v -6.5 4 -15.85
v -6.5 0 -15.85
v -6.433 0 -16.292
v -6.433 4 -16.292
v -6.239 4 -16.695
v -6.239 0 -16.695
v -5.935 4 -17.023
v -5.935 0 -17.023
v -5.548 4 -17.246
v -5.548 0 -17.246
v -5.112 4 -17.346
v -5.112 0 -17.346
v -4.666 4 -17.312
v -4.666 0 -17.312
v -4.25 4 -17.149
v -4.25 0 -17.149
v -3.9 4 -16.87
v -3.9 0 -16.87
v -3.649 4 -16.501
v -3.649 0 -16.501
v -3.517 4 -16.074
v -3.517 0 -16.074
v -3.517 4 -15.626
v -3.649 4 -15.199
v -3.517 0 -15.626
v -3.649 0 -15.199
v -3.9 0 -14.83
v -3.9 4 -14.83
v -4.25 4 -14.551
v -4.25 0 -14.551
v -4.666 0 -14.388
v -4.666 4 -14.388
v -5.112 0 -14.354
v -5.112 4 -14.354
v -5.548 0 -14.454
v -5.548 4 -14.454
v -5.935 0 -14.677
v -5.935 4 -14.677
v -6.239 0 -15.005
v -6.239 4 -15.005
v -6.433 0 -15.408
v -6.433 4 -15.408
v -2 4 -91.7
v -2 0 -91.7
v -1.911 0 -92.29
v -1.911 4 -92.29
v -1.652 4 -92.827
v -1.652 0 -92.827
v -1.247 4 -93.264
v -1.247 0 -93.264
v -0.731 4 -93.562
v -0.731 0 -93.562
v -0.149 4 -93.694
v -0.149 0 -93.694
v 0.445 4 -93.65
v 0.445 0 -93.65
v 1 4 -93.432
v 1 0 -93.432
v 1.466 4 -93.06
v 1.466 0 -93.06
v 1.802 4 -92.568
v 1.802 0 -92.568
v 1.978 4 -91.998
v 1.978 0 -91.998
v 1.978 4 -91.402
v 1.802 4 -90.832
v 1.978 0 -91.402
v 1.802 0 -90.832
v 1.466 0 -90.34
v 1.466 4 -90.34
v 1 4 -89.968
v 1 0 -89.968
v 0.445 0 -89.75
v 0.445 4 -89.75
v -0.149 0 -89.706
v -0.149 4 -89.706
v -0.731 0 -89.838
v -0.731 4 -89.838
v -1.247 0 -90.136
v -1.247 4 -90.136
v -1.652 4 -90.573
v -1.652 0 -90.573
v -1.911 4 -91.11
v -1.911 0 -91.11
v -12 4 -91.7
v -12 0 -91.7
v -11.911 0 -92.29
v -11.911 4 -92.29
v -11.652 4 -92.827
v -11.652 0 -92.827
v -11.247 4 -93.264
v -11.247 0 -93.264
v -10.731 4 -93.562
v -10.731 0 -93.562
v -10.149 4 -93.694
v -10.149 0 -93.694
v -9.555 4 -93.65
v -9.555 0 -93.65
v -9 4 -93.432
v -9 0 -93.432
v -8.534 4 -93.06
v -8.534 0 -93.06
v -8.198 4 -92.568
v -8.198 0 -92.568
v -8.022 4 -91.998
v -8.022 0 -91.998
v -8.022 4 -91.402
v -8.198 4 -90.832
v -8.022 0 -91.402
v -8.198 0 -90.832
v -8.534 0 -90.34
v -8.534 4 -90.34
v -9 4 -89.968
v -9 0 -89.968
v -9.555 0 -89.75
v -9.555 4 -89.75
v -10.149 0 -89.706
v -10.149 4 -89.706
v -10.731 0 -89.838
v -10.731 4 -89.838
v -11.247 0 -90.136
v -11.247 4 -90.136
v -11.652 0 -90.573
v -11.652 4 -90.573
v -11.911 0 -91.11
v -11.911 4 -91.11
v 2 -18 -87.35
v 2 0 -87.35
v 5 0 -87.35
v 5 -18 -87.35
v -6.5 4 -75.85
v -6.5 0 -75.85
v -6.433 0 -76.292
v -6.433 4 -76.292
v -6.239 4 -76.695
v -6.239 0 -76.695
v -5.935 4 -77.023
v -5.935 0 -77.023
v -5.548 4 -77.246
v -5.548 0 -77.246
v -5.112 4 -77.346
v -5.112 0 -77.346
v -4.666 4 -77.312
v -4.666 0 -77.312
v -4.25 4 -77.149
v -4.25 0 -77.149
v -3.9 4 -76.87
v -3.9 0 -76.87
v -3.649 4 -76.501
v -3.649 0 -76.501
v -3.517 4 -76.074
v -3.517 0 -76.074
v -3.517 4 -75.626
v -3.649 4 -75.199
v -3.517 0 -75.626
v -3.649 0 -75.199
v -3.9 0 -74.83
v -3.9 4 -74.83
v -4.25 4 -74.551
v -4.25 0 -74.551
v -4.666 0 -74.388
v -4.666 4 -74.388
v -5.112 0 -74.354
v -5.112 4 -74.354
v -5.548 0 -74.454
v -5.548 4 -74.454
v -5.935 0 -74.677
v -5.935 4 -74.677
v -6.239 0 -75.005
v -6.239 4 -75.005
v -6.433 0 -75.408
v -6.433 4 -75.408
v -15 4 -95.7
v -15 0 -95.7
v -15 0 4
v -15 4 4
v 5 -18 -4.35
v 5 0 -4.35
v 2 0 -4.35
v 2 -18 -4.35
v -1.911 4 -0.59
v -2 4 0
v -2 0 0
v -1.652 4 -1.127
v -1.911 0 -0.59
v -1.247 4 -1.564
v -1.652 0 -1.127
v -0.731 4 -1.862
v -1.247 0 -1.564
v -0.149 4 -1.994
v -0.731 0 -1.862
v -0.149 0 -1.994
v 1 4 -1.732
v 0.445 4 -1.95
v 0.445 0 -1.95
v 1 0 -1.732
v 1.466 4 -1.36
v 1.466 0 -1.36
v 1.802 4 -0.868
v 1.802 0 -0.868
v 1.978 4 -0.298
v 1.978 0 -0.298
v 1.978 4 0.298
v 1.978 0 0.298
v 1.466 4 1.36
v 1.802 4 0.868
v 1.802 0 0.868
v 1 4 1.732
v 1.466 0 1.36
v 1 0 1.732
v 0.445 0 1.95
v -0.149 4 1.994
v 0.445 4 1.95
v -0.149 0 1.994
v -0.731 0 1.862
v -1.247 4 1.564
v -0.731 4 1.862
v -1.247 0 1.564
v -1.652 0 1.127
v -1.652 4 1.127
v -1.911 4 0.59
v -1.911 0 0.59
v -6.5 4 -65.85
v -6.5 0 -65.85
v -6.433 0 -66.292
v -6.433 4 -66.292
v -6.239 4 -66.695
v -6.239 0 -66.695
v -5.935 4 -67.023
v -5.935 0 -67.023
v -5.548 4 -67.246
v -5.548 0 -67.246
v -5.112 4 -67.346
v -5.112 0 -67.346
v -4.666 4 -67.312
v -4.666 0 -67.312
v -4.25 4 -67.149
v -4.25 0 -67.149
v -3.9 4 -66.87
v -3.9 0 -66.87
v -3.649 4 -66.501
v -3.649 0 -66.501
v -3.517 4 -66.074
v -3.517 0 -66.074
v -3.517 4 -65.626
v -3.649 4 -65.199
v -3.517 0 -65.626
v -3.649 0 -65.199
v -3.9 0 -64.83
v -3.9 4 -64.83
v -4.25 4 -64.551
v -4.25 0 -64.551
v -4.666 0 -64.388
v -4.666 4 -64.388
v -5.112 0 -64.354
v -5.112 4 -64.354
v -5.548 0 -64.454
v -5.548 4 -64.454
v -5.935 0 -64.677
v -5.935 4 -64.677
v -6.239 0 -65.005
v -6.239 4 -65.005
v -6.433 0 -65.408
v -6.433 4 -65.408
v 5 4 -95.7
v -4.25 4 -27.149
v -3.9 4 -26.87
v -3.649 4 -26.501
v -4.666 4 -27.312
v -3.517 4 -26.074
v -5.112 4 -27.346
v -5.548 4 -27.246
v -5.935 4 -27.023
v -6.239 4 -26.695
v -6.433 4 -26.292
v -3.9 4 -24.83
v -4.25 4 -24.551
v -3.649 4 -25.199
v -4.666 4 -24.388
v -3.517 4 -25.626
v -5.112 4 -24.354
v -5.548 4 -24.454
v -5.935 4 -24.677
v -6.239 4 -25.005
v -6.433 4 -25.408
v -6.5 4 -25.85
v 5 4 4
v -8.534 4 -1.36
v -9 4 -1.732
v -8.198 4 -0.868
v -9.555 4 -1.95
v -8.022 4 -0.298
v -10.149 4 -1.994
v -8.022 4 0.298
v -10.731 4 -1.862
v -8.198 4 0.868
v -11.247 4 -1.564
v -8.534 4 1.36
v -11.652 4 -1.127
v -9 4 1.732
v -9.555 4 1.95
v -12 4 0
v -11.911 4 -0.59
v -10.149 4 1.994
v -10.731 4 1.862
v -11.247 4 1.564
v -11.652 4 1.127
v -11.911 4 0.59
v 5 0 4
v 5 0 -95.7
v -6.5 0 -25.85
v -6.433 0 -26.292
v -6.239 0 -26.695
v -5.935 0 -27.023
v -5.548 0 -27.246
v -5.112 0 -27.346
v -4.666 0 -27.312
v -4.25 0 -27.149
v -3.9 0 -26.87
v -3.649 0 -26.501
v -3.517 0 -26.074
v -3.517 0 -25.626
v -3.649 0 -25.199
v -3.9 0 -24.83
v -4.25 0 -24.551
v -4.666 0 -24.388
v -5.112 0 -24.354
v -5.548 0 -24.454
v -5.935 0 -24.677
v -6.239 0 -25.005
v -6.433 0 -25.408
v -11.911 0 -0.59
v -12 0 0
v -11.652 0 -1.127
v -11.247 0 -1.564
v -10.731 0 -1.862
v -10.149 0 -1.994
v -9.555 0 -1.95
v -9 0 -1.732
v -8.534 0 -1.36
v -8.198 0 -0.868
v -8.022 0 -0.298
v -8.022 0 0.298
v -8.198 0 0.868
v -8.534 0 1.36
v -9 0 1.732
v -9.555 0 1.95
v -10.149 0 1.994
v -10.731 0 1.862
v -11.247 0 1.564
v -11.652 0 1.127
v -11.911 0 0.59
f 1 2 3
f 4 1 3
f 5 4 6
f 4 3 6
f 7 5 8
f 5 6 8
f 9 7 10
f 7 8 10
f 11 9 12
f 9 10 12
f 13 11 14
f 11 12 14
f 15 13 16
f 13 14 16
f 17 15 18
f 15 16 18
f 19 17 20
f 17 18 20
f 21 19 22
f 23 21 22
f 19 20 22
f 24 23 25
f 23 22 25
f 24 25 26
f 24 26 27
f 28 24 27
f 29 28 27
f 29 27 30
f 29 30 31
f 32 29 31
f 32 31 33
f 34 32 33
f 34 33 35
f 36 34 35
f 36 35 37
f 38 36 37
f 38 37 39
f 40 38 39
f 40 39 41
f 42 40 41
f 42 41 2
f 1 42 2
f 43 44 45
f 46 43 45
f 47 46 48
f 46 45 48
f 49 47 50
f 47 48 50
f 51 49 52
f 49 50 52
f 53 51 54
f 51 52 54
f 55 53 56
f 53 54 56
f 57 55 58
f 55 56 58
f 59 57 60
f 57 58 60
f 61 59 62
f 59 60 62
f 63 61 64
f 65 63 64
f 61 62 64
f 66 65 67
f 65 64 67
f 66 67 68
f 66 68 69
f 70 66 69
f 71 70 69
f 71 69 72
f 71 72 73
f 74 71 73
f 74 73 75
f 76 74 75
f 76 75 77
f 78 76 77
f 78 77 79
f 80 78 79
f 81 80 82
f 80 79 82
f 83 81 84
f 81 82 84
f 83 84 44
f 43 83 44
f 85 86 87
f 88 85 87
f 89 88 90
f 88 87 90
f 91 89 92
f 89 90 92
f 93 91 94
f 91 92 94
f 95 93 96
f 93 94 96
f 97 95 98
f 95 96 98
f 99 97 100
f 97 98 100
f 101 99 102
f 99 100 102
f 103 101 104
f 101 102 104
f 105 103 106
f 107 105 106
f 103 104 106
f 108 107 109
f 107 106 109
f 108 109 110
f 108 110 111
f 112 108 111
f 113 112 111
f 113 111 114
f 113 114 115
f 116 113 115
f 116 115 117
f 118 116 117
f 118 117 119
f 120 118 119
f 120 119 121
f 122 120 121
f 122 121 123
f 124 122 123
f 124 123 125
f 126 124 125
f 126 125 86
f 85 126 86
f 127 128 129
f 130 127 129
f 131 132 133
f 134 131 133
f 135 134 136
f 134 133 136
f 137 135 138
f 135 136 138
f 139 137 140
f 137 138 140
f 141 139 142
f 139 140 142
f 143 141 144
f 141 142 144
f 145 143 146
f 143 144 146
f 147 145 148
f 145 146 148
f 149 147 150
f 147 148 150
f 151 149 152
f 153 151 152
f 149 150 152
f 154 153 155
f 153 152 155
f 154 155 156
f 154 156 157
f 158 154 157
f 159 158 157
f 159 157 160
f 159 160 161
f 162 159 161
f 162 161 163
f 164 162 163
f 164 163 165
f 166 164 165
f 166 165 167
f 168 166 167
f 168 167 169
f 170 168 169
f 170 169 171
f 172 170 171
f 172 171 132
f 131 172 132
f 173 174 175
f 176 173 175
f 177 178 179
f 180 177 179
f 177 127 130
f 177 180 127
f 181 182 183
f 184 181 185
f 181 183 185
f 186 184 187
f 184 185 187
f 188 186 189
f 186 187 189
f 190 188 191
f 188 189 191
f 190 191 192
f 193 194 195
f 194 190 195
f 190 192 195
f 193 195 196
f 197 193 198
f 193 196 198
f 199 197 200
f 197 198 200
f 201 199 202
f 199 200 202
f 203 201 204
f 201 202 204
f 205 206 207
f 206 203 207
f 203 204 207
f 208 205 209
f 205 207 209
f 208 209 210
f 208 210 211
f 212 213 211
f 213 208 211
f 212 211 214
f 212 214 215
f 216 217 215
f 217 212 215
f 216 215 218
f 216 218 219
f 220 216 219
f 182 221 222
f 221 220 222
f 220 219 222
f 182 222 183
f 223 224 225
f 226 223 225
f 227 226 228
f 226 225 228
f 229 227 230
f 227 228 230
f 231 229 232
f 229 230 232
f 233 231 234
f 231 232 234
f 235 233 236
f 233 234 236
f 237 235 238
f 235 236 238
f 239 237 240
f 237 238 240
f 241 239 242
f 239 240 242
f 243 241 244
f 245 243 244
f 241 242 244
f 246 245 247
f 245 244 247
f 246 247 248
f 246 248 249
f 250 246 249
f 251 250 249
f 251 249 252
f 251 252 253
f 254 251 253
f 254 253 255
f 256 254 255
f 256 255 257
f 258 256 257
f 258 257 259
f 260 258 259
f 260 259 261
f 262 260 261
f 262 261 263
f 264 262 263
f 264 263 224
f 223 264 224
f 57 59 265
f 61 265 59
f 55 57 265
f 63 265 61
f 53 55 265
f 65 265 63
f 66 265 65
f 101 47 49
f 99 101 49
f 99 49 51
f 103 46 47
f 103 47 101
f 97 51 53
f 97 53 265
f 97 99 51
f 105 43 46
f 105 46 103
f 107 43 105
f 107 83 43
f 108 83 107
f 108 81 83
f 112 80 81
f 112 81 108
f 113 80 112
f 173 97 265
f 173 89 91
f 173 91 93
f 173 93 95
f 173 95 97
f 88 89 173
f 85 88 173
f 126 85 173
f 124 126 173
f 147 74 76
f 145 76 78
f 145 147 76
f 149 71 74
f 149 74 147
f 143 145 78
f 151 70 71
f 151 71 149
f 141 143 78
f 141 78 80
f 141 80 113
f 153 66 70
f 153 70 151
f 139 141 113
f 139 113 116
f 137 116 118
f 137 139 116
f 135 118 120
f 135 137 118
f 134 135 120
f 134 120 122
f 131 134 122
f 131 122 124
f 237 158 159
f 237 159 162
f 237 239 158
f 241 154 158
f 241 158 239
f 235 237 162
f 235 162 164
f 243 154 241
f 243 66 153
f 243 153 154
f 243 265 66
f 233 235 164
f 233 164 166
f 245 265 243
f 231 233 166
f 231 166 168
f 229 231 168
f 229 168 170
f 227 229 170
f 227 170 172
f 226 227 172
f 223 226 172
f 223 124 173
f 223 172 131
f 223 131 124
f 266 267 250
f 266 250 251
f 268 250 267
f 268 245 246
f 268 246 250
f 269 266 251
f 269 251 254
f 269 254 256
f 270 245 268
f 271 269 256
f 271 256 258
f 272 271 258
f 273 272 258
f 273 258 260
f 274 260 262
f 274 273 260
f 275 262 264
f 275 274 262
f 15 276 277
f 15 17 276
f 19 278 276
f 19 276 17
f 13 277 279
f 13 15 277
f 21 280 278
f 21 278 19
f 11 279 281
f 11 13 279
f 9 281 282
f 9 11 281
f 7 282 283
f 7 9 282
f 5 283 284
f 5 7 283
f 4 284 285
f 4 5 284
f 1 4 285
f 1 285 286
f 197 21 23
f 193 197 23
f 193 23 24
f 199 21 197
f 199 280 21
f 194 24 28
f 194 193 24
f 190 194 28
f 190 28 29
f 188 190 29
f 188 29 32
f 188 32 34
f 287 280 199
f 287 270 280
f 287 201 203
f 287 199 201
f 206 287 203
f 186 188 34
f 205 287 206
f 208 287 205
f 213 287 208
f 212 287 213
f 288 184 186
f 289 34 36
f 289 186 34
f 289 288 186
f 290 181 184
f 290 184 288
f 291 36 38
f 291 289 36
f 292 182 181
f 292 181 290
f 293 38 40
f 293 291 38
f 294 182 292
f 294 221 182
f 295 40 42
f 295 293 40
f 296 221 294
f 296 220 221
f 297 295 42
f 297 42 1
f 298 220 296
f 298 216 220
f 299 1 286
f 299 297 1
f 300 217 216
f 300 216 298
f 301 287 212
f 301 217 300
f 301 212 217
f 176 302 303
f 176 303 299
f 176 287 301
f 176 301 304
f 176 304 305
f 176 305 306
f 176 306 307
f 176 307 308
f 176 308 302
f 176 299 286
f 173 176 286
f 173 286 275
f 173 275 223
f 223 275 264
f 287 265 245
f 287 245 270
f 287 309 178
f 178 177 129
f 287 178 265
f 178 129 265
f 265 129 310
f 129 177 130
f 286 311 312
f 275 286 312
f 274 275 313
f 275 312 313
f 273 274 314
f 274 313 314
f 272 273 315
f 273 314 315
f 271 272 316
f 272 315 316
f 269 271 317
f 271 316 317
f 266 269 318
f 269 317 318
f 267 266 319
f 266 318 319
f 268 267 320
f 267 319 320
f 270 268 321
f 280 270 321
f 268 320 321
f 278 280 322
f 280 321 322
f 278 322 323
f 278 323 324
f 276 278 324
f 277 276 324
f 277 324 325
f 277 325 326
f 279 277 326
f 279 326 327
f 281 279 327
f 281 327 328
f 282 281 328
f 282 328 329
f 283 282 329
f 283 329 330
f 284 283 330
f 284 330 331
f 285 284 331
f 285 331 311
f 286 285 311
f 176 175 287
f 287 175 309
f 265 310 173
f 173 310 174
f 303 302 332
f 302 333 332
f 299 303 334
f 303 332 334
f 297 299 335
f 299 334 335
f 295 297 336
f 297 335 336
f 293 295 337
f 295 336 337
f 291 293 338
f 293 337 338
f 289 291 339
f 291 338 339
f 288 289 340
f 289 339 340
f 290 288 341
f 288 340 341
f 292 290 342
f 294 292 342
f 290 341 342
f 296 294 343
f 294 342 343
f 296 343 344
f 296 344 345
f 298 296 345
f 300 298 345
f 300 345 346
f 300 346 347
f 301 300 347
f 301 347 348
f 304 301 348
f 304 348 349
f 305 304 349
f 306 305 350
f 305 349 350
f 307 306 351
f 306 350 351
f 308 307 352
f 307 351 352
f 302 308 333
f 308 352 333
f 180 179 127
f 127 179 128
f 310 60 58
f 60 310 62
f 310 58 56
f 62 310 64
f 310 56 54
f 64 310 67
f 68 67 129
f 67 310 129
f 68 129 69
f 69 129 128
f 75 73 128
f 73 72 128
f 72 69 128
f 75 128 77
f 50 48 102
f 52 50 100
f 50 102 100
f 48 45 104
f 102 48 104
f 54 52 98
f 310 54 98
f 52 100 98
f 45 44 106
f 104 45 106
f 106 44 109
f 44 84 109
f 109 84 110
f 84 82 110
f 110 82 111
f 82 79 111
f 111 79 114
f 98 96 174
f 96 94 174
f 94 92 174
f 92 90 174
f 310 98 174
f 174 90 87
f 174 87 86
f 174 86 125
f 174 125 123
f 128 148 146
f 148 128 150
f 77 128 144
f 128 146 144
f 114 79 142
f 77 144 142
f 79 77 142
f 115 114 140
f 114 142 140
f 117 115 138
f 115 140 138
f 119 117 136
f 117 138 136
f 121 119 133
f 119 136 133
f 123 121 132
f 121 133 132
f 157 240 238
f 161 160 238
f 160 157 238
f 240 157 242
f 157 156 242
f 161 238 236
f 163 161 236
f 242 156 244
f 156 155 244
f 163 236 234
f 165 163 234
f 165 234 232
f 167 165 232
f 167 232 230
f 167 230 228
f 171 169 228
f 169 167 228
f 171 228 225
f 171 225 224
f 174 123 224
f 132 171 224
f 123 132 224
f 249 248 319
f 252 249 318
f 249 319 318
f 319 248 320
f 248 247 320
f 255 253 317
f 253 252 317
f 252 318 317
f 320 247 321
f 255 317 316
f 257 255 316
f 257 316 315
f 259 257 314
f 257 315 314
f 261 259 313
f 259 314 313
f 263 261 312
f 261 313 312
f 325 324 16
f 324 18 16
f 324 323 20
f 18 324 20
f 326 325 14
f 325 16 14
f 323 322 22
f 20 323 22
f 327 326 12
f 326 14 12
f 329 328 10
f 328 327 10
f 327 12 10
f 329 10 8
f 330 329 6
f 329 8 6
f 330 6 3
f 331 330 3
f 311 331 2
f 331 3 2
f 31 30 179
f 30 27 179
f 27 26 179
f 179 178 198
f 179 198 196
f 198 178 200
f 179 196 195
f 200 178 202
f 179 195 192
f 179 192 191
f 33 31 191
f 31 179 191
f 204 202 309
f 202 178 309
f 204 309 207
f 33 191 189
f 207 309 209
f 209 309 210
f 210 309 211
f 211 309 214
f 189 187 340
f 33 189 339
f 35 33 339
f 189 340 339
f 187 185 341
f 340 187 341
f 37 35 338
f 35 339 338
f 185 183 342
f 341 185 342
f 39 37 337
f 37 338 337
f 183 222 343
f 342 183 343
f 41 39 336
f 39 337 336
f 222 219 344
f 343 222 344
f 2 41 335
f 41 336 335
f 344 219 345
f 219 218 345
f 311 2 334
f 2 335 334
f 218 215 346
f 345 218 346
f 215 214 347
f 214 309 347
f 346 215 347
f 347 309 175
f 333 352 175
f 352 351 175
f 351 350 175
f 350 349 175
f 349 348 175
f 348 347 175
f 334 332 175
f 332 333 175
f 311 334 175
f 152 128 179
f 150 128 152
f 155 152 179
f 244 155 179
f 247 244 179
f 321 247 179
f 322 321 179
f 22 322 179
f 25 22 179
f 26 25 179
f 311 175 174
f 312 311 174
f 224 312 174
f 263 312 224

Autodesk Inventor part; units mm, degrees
ref_plane "YZ Plane" through (0, 0, 0) normal (1, 0, 0) x (0, 1, 0)
ref_plane "XZ Plane" through (0, 0, 0) normal (0, 1, 0) x (-1, 0, 0)
ref_plane "XY Plane" through (0, 0, 0) normal (0, 0, 1) x (1, 0, 0)
sketch "Sketch1" plane through (0, 0, 0) normal (0, 1, 0) x (-1, 0, 0)
  line L0 (0, 0) -> (10, 0)
  line L1 (10, 0) -> (10, -91.7)
  line L2 (10, -91.7) -> (0, -91.7)
  line L3 (0, -91.7) -> (0, 0)
  circle A0 centre (10, 0) radius 2
  circle A1 centre (0, 0) radius 2
  circle A2 centre (10, -91.7) radius 2
  circle A3 centre (0, -91.7) radius 2
  line L4 (10, 0) -> (15, 0)
  line L5 (15, 0) -> (15, 4)
  line L6 (15, 4) -> (10, 4)
  line L7 (10, 4) -> (10, 0)
  line L8 (0, -91.7) -> (-5, -91.7)
  line L9 (-5, -91.7) -> (-5, -95.7)
  line L10 (-5, -95.7) -> (0, -95.7)
  line L11 (0, -95.7) -> (0, -91.7)
  line L12 (15, 4) -> (-5, 4)
  line L13 (-5, 4) -> (-5, -95.7)
  line L14 (-5, -95.7) -> (15, -95.7)
  line L15 (15, -95.7) -> (15, 4)
  line L16 (5, 0) -> (5, -91.7)
  line L17 (5, -20.85) -> (5, -70.85)
  line L18 (5, -15.85) -> (5, -25.85)
  line L19 (5, -65.85) -> (5, -75.85)
  circle A4 centre (5, -15.85) radius 1.5
  circle A5 centre (5, -25.85) radius 1.5
  circle A6 centre (5, -65.85) radius 1.5
  circle A7 centre (5, -75.85) radius 1.5
  point P0 (5, -45.85)
  point P1 (-2, -91.7)
  point P2 (0, -93.7)
  dimension "d0" = 10
  dimension "d1" = 91.7
  dimension "d2" = 4
  dimension "d3" = 4
  dimension "d4" = 4
  dimension "d5" = 4
  dimension "d6" = 5
  dimension "d7" = 4
  dimension "d8" = 5
  dimension "d9" = 4
  dimension "d10" = 50
  dimension "d11" = 10
  dimension "d12" = 10
  dimension "d13" = 3
  dimension "d14" = 3
  dimension "d15" = 3
  dimension "d16" = 3
extrude "Extrusion1" add sketch "Sketch1" along normal blind 4 contours A1 L3 A3 L8 L13 L12 L7 A0 L0 | L0 L16 A4 A5 A6 A7 L2 A3 L3 A1 | L0 A0 L1 A2 L2 L16 A7 A6 A5 A4 | L2 A2 L1 A0 L4 L15 L14 L11 A3 | A3 L11 L10 L9 L8 | L7 L6 L5 L4 A0
sketch "Sketch2" plane through (0, 0, 0) normal (0, -1, 0) x (1, 0, 0)
  line L0 (5, 4) -> (5, -95.7) projected
  line L1 (5, -87.35) -> (5, -4.35)
  line L2 (5, -4.35) -> (2, -4.35)
  line L3 (2, -4.35) -> (2, -87.35)
  line L4 (2, -87.35) -> (5, -87.35)
  line L5 (5, -87.35) -> (5, -4.35)
  point P0 (0, 0)
  point P1 (5, -45.85)
  dimension "d19" = 83
  dimension "d20" = 3
extrude "Extrusion2" add sketch "Sketch2" along normal blind 18
properties part number "side_wall1"
